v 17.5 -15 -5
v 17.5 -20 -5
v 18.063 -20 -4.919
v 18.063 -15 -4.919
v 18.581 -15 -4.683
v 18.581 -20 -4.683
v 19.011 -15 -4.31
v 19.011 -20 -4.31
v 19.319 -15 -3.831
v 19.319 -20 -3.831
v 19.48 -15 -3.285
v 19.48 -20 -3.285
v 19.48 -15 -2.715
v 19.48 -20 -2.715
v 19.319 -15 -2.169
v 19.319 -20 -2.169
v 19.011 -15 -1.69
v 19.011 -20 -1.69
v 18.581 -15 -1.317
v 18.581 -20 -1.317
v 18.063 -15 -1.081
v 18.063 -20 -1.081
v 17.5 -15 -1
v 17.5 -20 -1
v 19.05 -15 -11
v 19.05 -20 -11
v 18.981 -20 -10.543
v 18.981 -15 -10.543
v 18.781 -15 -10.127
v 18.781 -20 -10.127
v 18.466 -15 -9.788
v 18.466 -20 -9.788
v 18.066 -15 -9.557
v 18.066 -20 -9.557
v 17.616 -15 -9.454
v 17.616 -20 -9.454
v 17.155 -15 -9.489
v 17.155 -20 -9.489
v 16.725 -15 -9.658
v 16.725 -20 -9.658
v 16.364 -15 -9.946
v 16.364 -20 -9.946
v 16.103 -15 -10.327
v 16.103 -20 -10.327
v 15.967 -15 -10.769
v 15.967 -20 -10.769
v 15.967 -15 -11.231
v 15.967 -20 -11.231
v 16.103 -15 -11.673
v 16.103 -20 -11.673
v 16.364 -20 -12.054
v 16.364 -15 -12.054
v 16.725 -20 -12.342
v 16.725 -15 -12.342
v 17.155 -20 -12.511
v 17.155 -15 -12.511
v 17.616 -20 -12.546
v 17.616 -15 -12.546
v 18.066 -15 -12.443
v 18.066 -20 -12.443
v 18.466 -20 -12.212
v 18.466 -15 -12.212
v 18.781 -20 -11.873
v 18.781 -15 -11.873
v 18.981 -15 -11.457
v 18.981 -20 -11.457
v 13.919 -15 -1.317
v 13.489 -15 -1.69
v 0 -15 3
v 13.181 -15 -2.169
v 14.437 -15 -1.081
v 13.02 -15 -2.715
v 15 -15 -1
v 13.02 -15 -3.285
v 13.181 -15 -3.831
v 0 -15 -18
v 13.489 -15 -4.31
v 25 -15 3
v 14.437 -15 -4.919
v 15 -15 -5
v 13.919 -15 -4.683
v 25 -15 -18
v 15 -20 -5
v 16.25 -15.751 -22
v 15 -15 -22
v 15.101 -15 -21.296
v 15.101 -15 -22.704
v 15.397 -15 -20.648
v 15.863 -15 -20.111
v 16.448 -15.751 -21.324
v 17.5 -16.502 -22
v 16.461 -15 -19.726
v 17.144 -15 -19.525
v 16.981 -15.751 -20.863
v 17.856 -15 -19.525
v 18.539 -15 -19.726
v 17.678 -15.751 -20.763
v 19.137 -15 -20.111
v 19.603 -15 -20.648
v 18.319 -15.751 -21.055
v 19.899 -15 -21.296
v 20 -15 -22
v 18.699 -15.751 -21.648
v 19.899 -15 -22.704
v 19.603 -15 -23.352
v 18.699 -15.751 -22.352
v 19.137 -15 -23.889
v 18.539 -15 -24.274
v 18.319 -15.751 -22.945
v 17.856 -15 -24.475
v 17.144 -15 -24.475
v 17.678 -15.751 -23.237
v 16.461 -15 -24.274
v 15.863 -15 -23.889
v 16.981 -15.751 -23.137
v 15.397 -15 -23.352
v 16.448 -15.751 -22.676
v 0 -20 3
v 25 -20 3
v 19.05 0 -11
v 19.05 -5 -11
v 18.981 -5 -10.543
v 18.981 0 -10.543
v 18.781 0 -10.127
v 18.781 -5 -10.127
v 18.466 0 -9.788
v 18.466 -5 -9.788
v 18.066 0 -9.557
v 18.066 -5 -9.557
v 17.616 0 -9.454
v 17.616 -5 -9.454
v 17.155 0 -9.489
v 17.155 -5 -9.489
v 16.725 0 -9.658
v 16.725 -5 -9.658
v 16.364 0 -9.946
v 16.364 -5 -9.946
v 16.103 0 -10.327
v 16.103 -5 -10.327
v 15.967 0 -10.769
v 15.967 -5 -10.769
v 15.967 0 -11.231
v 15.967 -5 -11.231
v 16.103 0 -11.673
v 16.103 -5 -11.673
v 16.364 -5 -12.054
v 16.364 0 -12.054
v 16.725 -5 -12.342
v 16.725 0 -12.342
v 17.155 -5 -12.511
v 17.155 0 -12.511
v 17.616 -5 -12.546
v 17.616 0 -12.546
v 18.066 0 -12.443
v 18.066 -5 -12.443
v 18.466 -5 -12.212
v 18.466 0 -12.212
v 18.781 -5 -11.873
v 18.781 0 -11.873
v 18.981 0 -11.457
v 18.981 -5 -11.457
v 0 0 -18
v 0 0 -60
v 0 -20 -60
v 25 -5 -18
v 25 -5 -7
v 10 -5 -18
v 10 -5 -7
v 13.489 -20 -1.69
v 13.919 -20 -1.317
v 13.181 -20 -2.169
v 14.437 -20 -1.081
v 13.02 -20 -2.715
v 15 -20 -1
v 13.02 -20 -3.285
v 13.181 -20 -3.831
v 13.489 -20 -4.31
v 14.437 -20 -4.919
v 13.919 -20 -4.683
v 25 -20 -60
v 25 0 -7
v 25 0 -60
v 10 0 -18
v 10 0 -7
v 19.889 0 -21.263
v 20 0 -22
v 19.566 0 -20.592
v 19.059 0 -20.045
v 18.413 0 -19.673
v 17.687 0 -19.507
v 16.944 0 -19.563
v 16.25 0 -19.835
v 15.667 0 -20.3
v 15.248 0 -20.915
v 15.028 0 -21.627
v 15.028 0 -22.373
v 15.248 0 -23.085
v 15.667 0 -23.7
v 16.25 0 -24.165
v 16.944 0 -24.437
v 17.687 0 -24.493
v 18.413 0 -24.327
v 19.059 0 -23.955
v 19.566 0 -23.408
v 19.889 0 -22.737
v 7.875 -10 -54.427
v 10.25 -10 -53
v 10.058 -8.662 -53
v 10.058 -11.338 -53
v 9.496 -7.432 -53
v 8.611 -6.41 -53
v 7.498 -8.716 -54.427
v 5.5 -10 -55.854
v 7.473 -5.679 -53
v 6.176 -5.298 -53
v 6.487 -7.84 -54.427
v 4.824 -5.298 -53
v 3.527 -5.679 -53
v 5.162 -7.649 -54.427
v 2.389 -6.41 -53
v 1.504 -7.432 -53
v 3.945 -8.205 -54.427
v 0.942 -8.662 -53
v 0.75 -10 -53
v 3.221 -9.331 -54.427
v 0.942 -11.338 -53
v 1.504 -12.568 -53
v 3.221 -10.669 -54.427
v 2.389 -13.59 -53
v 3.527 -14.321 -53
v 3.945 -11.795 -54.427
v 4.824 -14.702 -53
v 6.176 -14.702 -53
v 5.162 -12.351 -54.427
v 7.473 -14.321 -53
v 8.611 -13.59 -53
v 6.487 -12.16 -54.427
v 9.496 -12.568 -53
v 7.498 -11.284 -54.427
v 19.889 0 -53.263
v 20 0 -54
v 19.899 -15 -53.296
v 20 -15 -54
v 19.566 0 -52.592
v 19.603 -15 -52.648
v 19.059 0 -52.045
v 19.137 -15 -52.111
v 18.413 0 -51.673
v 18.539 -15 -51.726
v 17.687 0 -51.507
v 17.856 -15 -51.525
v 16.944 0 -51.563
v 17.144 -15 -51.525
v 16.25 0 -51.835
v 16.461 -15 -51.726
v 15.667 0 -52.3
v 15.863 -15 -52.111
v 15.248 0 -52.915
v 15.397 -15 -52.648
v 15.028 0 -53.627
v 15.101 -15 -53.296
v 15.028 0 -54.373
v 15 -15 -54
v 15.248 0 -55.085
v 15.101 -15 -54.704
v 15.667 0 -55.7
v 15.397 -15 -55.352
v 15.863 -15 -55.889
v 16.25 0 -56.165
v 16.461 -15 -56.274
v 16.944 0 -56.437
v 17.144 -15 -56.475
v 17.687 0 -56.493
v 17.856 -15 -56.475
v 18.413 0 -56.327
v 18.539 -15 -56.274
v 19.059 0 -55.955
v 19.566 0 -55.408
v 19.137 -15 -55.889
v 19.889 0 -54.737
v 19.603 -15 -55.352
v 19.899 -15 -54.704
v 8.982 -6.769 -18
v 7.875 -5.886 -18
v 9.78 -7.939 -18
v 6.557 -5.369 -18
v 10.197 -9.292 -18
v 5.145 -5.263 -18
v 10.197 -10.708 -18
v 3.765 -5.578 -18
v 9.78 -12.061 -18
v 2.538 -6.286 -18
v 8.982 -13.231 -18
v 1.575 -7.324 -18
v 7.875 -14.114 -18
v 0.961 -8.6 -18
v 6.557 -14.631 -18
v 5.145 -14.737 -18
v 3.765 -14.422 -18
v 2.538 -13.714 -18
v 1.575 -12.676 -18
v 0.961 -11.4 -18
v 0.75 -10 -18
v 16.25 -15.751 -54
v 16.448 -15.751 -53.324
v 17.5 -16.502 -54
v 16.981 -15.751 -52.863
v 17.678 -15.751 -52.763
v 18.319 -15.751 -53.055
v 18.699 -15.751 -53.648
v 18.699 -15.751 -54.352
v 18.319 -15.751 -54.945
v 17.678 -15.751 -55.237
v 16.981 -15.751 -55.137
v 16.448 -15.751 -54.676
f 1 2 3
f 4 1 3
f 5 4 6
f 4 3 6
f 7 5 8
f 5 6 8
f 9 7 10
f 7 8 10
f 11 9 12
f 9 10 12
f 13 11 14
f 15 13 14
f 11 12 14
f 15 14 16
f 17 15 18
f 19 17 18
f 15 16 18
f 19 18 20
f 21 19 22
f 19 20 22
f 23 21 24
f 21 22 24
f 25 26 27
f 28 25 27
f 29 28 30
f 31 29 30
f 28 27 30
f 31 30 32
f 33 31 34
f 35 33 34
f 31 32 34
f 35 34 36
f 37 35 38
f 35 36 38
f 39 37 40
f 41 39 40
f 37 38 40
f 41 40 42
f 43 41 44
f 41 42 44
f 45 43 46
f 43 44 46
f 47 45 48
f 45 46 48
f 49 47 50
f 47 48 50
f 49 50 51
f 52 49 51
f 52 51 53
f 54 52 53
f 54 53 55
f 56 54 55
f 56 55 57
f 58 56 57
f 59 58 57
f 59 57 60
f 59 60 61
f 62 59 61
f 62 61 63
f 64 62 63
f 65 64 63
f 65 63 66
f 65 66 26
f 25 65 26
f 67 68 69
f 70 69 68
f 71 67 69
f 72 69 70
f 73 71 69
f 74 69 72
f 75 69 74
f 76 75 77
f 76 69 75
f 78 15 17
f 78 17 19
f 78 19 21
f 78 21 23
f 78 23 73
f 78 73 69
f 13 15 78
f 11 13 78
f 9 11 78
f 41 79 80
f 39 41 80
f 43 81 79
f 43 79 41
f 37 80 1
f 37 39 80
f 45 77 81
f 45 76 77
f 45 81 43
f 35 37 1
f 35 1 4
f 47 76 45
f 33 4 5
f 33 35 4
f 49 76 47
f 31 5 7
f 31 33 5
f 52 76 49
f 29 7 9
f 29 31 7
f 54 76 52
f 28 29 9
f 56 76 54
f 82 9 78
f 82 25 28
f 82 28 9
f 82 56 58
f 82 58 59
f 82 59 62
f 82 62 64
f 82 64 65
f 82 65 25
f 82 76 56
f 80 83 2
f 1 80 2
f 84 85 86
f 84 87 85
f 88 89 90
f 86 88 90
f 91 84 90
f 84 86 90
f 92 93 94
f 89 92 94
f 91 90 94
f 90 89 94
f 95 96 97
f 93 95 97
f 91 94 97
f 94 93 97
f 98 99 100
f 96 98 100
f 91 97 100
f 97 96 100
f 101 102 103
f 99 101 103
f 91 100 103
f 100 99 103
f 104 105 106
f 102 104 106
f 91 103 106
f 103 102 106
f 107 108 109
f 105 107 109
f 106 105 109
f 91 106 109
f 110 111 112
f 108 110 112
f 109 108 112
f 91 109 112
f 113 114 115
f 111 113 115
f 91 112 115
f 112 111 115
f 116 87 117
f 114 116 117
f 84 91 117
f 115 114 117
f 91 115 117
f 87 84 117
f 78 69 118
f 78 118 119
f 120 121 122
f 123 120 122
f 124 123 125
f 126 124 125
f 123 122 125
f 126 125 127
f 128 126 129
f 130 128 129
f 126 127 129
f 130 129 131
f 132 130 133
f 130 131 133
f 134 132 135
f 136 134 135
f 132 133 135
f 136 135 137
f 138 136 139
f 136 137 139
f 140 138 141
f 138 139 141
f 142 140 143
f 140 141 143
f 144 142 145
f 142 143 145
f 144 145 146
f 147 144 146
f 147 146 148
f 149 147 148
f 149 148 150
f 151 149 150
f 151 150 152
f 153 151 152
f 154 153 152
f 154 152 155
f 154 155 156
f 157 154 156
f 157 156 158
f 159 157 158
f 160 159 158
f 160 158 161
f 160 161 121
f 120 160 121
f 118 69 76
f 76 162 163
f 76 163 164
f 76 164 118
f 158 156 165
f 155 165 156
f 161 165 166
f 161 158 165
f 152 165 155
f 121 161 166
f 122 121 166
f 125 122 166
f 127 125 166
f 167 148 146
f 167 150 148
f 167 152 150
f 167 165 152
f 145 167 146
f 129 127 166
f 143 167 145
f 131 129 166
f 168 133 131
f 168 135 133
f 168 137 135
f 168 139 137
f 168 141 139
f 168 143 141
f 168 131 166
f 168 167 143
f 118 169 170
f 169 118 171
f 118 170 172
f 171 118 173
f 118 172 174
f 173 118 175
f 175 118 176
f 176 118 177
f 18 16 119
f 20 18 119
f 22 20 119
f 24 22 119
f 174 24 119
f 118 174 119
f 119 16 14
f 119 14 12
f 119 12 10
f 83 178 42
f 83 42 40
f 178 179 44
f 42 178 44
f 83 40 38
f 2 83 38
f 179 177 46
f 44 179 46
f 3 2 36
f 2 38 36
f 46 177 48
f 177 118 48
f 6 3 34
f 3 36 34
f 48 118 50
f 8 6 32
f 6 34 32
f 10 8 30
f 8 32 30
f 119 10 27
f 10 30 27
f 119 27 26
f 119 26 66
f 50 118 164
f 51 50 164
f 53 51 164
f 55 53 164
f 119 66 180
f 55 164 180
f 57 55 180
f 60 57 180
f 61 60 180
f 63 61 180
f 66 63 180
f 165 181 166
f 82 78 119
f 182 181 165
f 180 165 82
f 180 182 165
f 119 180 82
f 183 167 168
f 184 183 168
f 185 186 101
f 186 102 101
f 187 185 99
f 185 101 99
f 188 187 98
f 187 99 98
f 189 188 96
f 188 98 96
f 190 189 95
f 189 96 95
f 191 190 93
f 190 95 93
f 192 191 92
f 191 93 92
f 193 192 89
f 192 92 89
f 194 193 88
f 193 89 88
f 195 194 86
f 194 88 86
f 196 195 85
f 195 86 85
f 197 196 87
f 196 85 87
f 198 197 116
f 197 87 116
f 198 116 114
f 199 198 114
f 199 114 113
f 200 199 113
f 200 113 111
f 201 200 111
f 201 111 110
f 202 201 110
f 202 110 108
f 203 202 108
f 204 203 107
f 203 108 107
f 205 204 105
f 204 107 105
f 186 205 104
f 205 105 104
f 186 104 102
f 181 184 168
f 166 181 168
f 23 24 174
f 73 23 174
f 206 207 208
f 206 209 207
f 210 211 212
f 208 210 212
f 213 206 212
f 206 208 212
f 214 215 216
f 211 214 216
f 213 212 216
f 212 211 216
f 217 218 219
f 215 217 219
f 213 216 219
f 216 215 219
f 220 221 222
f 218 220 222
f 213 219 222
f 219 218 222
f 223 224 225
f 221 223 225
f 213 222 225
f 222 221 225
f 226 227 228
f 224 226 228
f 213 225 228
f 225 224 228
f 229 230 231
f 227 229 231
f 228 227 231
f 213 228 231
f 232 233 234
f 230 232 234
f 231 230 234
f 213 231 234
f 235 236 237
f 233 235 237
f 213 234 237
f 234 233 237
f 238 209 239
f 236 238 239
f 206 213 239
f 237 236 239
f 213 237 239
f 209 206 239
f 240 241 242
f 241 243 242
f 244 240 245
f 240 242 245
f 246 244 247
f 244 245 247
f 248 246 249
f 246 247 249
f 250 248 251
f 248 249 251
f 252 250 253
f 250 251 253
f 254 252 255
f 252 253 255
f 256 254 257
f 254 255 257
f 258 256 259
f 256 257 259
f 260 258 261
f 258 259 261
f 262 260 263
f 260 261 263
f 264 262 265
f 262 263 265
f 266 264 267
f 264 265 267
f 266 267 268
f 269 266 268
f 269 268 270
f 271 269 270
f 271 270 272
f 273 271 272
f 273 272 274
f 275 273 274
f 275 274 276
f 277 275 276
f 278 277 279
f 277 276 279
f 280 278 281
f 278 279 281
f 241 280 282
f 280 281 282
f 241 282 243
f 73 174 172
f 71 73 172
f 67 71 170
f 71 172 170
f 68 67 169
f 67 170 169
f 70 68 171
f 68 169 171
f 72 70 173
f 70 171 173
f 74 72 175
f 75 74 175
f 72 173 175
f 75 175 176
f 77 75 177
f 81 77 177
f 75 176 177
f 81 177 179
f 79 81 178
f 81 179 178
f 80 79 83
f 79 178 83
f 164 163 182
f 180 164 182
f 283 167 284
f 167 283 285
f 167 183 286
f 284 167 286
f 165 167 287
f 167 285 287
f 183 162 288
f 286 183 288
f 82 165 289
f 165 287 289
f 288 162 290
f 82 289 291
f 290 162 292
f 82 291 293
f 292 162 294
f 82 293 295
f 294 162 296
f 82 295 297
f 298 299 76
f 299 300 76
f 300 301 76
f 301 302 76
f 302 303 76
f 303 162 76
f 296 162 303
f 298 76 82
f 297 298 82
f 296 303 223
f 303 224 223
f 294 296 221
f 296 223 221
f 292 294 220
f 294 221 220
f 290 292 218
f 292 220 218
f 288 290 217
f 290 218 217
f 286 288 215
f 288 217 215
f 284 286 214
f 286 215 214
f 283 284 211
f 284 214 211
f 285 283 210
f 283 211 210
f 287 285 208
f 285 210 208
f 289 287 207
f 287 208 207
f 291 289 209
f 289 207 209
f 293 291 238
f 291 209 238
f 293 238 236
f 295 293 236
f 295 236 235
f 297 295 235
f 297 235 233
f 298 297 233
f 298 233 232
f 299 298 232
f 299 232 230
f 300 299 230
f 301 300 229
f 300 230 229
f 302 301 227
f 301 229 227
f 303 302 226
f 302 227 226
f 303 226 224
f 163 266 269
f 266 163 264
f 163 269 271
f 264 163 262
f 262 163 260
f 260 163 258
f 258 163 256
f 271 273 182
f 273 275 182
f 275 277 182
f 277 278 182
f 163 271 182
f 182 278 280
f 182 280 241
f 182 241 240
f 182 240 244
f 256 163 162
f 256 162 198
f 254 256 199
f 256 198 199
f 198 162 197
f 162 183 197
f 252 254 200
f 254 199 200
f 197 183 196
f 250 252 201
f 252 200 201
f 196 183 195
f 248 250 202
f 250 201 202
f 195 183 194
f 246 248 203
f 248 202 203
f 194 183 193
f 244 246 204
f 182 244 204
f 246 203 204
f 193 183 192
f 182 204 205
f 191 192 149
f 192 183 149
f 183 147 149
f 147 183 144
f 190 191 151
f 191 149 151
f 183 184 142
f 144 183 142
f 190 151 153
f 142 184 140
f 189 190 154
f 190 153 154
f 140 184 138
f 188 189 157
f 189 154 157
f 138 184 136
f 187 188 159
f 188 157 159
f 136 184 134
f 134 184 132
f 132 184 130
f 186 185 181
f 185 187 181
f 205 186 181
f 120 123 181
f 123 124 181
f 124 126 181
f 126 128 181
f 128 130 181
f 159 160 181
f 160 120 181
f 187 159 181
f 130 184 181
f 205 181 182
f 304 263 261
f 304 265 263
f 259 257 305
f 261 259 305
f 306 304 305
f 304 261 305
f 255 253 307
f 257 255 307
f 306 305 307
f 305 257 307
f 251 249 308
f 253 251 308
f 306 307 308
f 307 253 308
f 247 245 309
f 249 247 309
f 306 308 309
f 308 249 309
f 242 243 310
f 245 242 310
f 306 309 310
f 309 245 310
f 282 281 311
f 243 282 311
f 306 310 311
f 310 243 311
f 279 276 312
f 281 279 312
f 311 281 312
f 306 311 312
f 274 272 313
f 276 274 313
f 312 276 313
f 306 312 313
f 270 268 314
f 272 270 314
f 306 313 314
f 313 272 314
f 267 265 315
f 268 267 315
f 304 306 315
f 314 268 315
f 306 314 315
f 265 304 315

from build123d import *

# Parameters (mm, degrees)
F0_W      = 25
F0_H      = 60
F1_DEPTH  = 20
F2_W      = 10
F2_H      = 18
F3_DEPTH  = 25.001
F4_W      = 5
F4_H      = 7
F5_DEPTH  = 25.001
F7_D      = 3.1
F9_D      = 9.5
F9_DEPTH  = 35
F9_TIP    = 2.8540879404
F11_DEPTH = 20.001
F13_D     = 5
F13_DEPTH = 15
F13_TIP   = 1.5021515476
F14_DEPTH = 3
F15_W     = 10
F15_H     = 11
F16_DEPTH = 5.001


with BuildPart() as f1:
    # F0 (on Front) → F1 (new body)
    with BuildSketch(Plane.XZ):
        with Locations((12.5, -30)):
            Rectangle(F0_W, F0_H)
    extrude(amount=F1_DEPTH)

    # F2 (on face) → F3 (cut, through all)
    with BuildSketch(Plane(origin=(0, 0, 0), x_dir=(0, -1, 0), z_dir=(-1, 0, 0))):
        with Locations((10, -9)):
            Rectangle(F2_W, F2_H)
    extrude(amount=-F3_DEPTH, mode=Mode.SUBTRACT)

    # F4 (on face) → F5 (cut, through all)
    with BuildSketch(Plane(origin=(0, 0, 0), x_dir=(0, -1, 0), z_dir=(-1, 0, 0))):
        with Locations((2.5, -3.5)):
            Rectangle(F4_W, F4_H)
    extrude(amount=-F5_DEPTH, mode=Mode.SUBTRACT)

    # F7 (through all)
    with Locations(Plane(origin=(0, 0, 0), x_dir=(-1, 0, 0), z_dir=(0, 1, 0))):
        with Locations((-17.5, -11)):
            Hole(F7_D / 2)

    # F9
    with Locations(Plane.XY.offset(-18)):
        with Locations((5.5, -10)):
            Hole(F9_D / 2, depth=F9_DEPTH)
            with Locations((0, 0, -(F9_DEPTH + F9_TIP / 2))):  # 118° drill point
                Cone(0, F9_D / 2, F9_TIP, mode=Mode.SUBTRACT)

    # F10 (on face) → F11 (cut, through all)
    with BuildSketch(Plane.XZ.offset(20)):
        with BuildLine():
            Line((17.5, -1), (15, -1))
            ThreePointArc((15, -1), (13, -3), (15, -5))
            Line((15, -5), (17.5, -5))
            ThreePointArc((17.5, -5), (19.5, -3), (17.5, -1))
        make_face()
    extrude(amount=-F11_DEPTH, mode=Mode.SUBTRACT)

    # F13
    with Locations(Plane(origin=(0, 0, 0), x_dir=(-1, 0, 0), z_dir=(0, 1, 0))):
        with Locations((-17.5, -54), (-17.5, -22)):
            Hole(F13_D / 2, depth=F13_DEPTH)
            with Locations((0, 0, -(F13_DEPTH + F13_TIP / 2))):  # 118° drill point
                Cone(0, F13_D / 2, F13_TIP, mode=Mode.SUBTRACT)

    # F14 (add): a face of the model
    f14_faces = [f1.faces().sort_by_distance(p)[0] for p in [
        (12.5, -17.5, 0),
    ]]
    extrude(f14_faces, amount=F14_DEPTH)

    # F15 (on face) → F16 (cut, through all)
    with BuildSketch(Plane.XZ.offset(5)):
        with Locations((5, -12.5)):
            Rectangle(F15_W, F15_H)
    extrude(amount=-F16_DEPTH, mode=Mode.SUBTRACT)


solid = f1.part
